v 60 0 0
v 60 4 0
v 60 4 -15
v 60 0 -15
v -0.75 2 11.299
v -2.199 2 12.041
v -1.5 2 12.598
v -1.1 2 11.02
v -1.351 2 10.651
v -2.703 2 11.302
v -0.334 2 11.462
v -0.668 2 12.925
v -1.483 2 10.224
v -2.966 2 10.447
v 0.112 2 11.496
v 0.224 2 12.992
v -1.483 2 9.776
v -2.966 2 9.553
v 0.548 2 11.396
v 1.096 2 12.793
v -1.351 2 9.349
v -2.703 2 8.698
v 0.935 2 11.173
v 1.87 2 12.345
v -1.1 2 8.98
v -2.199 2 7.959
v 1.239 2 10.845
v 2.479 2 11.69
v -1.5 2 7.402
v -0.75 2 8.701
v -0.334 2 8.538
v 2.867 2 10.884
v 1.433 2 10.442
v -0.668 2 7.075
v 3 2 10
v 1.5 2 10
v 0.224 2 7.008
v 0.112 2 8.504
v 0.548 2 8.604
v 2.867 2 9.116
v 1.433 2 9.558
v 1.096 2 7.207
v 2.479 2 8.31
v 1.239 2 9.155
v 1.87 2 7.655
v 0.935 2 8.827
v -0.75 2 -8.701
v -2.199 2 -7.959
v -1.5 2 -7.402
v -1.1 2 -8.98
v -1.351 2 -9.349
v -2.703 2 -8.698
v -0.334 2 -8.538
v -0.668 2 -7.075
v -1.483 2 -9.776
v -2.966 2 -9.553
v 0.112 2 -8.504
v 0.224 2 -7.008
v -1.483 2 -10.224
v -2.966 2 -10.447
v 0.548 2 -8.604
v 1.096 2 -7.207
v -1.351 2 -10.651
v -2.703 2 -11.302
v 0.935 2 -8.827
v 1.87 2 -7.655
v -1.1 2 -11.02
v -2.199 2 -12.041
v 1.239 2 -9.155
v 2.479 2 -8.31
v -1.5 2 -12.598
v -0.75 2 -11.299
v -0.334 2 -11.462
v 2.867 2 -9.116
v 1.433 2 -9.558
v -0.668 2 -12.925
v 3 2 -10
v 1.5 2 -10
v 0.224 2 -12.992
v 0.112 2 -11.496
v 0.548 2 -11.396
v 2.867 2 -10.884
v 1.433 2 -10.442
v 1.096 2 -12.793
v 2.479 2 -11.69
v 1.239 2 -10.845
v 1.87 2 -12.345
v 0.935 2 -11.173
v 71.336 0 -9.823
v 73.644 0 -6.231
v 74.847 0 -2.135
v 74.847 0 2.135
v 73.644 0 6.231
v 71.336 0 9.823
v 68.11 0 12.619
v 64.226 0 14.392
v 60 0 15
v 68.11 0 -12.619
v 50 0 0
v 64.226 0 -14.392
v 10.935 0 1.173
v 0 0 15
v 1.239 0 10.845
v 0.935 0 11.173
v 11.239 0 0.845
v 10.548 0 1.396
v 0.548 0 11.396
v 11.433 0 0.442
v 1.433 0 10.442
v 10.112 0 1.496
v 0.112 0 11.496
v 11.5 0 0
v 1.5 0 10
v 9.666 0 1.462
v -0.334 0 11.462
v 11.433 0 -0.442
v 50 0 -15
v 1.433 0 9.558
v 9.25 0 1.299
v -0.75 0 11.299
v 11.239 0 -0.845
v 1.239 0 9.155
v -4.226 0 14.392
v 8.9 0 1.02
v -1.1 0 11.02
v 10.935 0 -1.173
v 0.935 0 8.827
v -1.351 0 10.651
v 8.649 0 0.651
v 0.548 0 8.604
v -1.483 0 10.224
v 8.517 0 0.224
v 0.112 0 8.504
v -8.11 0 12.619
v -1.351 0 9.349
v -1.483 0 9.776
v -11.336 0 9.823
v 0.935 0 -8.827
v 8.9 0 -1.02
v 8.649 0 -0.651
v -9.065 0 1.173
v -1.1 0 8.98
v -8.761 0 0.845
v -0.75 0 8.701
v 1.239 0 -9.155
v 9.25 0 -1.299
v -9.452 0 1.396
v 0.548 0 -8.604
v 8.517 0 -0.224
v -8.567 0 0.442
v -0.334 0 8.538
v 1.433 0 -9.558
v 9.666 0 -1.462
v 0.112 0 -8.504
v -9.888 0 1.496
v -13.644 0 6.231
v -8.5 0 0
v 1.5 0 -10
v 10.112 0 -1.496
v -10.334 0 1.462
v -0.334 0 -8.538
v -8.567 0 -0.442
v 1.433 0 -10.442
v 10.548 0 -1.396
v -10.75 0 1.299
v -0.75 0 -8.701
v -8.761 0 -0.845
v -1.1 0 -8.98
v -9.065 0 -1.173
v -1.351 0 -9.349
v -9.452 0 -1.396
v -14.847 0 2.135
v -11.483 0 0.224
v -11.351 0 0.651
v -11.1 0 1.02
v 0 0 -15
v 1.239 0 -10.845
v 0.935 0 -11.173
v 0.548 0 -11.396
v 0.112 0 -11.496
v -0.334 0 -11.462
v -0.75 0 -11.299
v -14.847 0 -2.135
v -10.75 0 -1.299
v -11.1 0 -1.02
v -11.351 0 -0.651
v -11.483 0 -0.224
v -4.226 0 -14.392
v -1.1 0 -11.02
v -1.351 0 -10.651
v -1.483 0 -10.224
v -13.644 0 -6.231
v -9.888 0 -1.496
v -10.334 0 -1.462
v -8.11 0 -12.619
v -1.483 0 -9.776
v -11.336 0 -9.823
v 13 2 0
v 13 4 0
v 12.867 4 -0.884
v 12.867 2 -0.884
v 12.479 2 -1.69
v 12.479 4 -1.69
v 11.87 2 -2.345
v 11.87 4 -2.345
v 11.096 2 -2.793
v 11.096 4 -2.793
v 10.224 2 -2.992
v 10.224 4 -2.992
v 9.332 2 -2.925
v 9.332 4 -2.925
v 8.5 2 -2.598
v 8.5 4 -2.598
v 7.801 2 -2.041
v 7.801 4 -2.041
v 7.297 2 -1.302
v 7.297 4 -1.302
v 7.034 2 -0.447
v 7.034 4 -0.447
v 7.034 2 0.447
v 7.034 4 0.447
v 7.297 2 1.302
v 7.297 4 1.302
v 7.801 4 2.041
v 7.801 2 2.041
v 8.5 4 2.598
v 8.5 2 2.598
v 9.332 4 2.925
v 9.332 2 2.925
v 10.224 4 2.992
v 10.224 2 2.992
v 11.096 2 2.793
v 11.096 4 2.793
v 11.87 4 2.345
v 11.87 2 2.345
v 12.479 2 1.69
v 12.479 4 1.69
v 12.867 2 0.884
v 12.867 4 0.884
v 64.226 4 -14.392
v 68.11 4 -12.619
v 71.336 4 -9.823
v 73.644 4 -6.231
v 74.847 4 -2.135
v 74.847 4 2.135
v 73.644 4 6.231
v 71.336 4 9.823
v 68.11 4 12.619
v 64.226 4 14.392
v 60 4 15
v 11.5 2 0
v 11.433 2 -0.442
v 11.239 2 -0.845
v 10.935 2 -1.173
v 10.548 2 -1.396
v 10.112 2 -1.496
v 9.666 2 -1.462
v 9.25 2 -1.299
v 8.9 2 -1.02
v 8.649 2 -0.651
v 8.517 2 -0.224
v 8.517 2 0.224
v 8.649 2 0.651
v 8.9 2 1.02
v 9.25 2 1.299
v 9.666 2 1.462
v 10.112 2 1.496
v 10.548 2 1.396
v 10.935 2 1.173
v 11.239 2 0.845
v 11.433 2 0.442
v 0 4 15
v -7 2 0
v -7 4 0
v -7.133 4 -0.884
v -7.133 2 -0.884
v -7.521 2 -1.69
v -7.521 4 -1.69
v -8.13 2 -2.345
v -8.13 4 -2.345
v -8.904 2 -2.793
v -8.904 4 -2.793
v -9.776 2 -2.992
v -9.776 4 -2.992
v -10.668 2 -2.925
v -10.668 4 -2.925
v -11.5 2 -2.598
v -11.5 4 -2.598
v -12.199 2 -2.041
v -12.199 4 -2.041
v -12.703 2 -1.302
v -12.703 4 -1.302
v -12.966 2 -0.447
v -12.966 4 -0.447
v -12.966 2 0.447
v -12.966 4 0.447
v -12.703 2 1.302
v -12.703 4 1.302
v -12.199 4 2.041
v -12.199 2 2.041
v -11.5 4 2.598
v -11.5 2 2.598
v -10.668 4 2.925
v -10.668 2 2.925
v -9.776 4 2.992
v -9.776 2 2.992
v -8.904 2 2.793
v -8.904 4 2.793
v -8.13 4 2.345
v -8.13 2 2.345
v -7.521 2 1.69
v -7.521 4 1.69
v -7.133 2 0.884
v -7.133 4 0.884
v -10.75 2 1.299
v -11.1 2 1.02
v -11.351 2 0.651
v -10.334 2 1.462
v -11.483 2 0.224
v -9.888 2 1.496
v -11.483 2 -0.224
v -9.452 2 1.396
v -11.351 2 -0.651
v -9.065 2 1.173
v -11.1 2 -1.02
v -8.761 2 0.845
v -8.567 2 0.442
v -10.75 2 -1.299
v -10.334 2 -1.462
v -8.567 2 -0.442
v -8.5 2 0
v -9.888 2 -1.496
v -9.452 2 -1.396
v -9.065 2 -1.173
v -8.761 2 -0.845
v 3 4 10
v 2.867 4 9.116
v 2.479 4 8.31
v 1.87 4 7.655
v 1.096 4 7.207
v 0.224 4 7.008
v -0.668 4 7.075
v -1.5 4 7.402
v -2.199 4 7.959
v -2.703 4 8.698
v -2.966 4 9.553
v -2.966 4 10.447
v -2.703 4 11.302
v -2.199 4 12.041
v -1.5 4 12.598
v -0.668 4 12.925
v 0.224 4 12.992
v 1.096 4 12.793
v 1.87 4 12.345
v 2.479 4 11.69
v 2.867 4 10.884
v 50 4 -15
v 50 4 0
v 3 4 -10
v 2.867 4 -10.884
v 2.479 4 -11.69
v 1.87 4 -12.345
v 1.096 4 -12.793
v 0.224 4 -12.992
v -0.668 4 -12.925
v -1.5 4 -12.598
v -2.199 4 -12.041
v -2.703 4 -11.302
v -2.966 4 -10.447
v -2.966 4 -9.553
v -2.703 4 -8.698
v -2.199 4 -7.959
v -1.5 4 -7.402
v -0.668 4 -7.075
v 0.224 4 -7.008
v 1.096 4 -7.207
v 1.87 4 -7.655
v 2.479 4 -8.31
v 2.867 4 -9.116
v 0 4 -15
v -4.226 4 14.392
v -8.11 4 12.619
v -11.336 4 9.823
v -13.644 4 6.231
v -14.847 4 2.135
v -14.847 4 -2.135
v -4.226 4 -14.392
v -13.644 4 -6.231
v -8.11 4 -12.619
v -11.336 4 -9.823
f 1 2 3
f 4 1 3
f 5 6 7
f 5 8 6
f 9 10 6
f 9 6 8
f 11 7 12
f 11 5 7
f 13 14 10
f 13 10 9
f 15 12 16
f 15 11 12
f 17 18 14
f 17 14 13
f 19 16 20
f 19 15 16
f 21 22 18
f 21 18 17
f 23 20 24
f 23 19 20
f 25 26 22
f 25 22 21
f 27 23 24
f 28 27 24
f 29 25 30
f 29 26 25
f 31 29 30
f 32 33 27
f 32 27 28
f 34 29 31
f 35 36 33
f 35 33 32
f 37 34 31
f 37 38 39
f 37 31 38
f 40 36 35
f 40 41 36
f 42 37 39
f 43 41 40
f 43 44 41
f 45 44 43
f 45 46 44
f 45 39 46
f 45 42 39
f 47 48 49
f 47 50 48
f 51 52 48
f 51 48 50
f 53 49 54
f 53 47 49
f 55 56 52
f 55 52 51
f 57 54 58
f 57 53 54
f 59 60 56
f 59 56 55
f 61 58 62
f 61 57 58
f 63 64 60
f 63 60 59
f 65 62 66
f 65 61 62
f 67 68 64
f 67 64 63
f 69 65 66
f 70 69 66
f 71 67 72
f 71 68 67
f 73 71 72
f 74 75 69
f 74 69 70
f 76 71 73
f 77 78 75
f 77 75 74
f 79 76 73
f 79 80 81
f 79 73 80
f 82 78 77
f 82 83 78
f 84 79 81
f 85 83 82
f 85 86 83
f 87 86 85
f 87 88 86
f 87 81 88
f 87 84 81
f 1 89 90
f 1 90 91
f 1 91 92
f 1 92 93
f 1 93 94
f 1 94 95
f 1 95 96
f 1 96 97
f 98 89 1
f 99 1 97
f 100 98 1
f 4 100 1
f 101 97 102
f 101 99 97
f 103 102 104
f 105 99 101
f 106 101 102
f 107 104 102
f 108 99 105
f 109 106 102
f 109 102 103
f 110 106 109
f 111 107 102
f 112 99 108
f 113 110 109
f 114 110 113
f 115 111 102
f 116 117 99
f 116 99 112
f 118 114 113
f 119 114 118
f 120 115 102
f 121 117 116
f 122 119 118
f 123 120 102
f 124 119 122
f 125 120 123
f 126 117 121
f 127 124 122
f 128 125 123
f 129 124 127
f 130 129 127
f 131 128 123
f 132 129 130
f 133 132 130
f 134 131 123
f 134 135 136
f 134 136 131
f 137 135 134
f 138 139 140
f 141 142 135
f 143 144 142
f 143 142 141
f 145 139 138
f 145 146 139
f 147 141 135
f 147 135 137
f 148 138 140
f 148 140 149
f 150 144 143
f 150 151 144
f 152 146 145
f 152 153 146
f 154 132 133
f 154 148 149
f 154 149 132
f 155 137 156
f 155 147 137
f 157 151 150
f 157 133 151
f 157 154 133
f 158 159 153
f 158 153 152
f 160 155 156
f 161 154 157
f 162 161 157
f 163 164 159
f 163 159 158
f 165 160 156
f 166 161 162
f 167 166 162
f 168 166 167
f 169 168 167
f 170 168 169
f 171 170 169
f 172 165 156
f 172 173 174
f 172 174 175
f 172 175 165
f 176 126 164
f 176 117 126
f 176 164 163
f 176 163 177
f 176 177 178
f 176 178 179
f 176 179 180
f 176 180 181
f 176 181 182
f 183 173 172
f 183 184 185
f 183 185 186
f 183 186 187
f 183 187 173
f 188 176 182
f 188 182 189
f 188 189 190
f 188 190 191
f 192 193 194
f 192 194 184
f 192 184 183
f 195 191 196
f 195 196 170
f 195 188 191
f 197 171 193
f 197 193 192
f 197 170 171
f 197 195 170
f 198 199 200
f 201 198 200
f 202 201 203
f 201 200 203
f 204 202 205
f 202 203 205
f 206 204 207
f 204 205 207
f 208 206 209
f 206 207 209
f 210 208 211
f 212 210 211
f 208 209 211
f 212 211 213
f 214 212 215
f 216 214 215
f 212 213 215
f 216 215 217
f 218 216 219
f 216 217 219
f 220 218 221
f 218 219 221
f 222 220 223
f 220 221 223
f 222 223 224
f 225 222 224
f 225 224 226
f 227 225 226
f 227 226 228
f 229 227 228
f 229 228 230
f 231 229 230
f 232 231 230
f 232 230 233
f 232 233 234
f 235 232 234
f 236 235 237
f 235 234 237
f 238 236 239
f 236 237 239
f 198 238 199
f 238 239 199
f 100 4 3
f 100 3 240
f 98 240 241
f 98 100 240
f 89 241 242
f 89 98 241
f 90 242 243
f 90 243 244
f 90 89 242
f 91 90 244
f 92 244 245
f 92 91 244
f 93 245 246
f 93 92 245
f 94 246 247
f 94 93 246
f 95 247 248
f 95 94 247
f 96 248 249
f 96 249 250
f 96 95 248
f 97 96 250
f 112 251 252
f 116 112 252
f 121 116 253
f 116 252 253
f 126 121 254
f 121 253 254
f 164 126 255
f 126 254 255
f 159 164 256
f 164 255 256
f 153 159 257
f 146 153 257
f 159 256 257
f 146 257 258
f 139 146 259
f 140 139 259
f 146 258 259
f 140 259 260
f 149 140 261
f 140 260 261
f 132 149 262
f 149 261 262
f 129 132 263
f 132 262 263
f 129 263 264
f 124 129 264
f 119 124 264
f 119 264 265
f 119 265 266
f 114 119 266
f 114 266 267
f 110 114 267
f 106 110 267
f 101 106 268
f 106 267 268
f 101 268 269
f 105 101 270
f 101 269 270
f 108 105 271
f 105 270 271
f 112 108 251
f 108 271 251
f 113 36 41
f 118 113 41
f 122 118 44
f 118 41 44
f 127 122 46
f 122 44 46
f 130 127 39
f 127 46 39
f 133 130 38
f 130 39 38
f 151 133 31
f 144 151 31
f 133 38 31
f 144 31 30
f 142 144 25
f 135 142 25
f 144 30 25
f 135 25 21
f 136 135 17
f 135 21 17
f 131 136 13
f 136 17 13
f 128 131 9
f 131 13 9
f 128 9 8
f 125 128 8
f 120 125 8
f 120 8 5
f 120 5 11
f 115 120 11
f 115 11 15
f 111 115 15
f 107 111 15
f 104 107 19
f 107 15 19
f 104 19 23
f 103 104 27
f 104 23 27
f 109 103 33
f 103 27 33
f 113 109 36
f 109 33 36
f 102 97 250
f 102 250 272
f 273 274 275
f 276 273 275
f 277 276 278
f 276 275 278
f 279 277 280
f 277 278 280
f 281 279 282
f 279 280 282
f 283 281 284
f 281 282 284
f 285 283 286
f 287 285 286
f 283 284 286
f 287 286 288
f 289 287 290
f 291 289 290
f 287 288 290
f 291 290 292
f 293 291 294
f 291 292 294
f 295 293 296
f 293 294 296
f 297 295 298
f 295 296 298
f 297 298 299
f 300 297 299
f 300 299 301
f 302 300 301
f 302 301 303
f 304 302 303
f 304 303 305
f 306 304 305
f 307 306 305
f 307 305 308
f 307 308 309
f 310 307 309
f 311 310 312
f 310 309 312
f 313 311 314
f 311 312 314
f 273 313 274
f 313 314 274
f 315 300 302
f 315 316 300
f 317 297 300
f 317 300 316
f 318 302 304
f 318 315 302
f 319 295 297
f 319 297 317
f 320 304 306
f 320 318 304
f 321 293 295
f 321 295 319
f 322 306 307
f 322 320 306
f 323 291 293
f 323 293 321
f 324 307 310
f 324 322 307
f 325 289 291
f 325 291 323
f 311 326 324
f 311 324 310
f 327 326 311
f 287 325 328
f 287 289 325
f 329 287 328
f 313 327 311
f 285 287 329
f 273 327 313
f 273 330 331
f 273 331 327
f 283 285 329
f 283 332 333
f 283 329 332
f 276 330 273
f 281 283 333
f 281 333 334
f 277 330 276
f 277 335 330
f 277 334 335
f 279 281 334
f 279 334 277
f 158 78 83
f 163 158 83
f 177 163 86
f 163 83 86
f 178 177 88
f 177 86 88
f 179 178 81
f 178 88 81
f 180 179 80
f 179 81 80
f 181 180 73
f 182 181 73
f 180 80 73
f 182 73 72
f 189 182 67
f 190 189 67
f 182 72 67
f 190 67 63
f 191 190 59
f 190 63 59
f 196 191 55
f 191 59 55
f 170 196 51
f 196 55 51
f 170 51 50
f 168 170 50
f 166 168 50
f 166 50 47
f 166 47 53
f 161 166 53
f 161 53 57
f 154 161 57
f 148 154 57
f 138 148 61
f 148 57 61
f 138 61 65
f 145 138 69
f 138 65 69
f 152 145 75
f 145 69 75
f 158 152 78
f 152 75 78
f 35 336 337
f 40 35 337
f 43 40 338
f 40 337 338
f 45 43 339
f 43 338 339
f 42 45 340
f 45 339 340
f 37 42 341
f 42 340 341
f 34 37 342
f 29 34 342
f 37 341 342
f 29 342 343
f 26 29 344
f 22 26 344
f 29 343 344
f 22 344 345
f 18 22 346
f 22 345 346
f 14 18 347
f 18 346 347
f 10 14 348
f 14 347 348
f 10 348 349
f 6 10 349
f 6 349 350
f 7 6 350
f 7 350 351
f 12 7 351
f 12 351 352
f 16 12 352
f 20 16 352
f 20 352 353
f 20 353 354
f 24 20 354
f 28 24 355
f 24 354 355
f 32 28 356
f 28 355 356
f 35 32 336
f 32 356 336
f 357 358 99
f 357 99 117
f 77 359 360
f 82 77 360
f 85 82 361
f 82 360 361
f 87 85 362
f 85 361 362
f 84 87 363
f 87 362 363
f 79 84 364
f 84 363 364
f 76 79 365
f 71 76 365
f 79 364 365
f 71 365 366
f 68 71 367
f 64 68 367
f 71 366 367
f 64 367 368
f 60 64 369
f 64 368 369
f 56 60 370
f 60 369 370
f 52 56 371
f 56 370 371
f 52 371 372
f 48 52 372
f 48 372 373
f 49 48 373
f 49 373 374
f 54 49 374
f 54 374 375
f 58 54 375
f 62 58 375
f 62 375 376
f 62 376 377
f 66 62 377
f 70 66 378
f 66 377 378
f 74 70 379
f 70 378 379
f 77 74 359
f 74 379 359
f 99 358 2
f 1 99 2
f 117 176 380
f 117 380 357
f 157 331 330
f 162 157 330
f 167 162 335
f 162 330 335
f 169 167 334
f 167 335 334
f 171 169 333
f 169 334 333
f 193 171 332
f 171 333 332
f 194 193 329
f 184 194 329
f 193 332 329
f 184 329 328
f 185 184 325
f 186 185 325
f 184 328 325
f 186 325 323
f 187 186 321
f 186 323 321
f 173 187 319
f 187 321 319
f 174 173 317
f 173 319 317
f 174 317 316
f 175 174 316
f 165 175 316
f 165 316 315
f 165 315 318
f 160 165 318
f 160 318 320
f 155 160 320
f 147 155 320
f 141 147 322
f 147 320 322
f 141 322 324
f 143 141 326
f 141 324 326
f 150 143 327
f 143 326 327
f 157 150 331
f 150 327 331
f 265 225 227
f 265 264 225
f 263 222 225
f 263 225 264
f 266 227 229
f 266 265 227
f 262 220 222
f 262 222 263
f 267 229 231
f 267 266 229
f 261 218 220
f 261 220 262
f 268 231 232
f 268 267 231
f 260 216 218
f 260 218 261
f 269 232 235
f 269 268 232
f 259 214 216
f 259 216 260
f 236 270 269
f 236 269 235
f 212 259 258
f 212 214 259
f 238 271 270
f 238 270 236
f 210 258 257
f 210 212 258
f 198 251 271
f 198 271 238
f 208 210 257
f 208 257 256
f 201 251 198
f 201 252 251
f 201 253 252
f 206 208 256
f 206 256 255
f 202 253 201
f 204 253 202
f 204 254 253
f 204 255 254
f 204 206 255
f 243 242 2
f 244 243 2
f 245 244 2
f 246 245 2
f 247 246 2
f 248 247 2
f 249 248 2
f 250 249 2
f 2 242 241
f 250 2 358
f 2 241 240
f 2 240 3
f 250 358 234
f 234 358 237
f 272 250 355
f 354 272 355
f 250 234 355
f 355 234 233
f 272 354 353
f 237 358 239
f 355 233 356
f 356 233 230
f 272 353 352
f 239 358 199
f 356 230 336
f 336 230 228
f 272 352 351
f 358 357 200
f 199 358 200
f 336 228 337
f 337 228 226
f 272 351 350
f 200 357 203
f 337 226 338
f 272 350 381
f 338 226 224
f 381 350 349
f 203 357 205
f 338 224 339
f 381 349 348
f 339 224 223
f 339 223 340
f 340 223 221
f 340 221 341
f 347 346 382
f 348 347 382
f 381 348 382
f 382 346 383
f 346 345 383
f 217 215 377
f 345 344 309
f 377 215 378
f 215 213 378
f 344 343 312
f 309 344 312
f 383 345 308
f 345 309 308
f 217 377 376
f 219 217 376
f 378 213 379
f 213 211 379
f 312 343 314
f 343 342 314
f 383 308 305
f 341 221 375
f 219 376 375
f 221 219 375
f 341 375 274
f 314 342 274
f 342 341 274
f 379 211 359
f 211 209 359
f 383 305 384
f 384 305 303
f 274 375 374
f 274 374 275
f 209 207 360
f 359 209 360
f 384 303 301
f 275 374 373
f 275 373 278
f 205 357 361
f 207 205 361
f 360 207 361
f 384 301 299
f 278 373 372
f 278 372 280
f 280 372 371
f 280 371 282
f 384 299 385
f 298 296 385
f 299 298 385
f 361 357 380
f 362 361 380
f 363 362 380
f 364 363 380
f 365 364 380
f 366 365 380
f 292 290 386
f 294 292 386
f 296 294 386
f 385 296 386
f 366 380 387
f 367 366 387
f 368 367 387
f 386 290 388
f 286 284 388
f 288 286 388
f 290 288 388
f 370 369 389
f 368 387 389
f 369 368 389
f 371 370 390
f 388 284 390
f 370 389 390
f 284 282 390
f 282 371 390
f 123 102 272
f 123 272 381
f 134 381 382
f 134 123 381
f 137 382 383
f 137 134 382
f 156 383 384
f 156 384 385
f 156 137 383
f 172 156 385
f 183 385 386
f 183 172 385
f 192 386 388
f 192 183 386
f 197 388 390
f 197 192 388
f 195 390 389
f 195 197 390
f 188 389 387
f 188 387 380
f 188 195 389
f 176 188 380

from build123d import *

# Parameters (mm, degrees)
BOSS_EXTRUDE1_DEPTH = 4
SKETCH2_W           = 10
SKETCH2_H           = 15
CUT_EXTRUDE1_DEPTH  = 4
SKETCH3_R           = 3
CUT_EXTRUDE2_DEPTH  = 2
SKETCH4_R           = 1.5
CUT_EXTRUDE3_DEPTH  = 2


with BuildPart() as part:
    # Sketch1 → Boss-Extrude1 (new body)
    with BuildSketch(Plane(origin=(0, 0, 0), x_dir=(1, 0, 0), z_dir=(0, 1, 0))):
        with BuildLine():
            Line((0, 15), (60, 15))
            ThreePointArc((60, 15), (75, 0), (60, -15))
            Line((60, -15), (0, -15))
            ThreePointArc((0, -15), (-15, 0), (0, 15))
        make_face()
    extrude(amount=BOSS_EXTRUDE1_DEPTH)

    # Sketch2 → Cut-Extrude1 (cut)
    with BuildSketch(Plane(origin=(0, 4, 0), x_dir=(1, 0, 0), z_dir=(0, 1, 0))):
        with Locations((55, 7.5)):
            Rectangle(SKETCH2_W, SKETCH2_H)
    extrude(amount=-CUT_EXTRUDE1_DEPTH, mode=Mode.SUBTRACT)

    # Sketch3 → Cut-Extrude2 (cut)
    with BuildSketch(Plane(origin=(0, 4, 0), x_dir=(1, 0, 0), z_dir=(0, 1, 0))):
        with Locations((-10, 0)):
            Circle(SKETCH3_R)
        with Locations((0, 10)):
            Circle(SKETCH3_R)
        with Locations((10, 0)):
            Circle(SKETCH3_R)
        with Locations((0, -10)):
            Circle(SKETCH3_R)
    extrude(amount=-CUT_EXTRUDE2_DEPTH, mode=Mode.SUBTRACT)

    # Sketch4 → Cut-Extrude3 (cut)
    with BuildSketch(Plane(origin=(0, 2, 0), x_dir=(1, 0, 0), z_dir=(0, 1, 0))):
        with Locations((-10, 0)):
            Circle(SKETCH4_R)
        with Locations((0, 10)):
            Circle(SKETCH4_R)
        with Locations((10, 0)):
            Circle(SKETCH4_R)
        with Locations((0, -10)):
            Circle(SKETCH4_R)
    extrude(amount=-CUT_EXTRUDE3_DEPTH, mode=Mode.SUBTRACT)


solid = part.part
